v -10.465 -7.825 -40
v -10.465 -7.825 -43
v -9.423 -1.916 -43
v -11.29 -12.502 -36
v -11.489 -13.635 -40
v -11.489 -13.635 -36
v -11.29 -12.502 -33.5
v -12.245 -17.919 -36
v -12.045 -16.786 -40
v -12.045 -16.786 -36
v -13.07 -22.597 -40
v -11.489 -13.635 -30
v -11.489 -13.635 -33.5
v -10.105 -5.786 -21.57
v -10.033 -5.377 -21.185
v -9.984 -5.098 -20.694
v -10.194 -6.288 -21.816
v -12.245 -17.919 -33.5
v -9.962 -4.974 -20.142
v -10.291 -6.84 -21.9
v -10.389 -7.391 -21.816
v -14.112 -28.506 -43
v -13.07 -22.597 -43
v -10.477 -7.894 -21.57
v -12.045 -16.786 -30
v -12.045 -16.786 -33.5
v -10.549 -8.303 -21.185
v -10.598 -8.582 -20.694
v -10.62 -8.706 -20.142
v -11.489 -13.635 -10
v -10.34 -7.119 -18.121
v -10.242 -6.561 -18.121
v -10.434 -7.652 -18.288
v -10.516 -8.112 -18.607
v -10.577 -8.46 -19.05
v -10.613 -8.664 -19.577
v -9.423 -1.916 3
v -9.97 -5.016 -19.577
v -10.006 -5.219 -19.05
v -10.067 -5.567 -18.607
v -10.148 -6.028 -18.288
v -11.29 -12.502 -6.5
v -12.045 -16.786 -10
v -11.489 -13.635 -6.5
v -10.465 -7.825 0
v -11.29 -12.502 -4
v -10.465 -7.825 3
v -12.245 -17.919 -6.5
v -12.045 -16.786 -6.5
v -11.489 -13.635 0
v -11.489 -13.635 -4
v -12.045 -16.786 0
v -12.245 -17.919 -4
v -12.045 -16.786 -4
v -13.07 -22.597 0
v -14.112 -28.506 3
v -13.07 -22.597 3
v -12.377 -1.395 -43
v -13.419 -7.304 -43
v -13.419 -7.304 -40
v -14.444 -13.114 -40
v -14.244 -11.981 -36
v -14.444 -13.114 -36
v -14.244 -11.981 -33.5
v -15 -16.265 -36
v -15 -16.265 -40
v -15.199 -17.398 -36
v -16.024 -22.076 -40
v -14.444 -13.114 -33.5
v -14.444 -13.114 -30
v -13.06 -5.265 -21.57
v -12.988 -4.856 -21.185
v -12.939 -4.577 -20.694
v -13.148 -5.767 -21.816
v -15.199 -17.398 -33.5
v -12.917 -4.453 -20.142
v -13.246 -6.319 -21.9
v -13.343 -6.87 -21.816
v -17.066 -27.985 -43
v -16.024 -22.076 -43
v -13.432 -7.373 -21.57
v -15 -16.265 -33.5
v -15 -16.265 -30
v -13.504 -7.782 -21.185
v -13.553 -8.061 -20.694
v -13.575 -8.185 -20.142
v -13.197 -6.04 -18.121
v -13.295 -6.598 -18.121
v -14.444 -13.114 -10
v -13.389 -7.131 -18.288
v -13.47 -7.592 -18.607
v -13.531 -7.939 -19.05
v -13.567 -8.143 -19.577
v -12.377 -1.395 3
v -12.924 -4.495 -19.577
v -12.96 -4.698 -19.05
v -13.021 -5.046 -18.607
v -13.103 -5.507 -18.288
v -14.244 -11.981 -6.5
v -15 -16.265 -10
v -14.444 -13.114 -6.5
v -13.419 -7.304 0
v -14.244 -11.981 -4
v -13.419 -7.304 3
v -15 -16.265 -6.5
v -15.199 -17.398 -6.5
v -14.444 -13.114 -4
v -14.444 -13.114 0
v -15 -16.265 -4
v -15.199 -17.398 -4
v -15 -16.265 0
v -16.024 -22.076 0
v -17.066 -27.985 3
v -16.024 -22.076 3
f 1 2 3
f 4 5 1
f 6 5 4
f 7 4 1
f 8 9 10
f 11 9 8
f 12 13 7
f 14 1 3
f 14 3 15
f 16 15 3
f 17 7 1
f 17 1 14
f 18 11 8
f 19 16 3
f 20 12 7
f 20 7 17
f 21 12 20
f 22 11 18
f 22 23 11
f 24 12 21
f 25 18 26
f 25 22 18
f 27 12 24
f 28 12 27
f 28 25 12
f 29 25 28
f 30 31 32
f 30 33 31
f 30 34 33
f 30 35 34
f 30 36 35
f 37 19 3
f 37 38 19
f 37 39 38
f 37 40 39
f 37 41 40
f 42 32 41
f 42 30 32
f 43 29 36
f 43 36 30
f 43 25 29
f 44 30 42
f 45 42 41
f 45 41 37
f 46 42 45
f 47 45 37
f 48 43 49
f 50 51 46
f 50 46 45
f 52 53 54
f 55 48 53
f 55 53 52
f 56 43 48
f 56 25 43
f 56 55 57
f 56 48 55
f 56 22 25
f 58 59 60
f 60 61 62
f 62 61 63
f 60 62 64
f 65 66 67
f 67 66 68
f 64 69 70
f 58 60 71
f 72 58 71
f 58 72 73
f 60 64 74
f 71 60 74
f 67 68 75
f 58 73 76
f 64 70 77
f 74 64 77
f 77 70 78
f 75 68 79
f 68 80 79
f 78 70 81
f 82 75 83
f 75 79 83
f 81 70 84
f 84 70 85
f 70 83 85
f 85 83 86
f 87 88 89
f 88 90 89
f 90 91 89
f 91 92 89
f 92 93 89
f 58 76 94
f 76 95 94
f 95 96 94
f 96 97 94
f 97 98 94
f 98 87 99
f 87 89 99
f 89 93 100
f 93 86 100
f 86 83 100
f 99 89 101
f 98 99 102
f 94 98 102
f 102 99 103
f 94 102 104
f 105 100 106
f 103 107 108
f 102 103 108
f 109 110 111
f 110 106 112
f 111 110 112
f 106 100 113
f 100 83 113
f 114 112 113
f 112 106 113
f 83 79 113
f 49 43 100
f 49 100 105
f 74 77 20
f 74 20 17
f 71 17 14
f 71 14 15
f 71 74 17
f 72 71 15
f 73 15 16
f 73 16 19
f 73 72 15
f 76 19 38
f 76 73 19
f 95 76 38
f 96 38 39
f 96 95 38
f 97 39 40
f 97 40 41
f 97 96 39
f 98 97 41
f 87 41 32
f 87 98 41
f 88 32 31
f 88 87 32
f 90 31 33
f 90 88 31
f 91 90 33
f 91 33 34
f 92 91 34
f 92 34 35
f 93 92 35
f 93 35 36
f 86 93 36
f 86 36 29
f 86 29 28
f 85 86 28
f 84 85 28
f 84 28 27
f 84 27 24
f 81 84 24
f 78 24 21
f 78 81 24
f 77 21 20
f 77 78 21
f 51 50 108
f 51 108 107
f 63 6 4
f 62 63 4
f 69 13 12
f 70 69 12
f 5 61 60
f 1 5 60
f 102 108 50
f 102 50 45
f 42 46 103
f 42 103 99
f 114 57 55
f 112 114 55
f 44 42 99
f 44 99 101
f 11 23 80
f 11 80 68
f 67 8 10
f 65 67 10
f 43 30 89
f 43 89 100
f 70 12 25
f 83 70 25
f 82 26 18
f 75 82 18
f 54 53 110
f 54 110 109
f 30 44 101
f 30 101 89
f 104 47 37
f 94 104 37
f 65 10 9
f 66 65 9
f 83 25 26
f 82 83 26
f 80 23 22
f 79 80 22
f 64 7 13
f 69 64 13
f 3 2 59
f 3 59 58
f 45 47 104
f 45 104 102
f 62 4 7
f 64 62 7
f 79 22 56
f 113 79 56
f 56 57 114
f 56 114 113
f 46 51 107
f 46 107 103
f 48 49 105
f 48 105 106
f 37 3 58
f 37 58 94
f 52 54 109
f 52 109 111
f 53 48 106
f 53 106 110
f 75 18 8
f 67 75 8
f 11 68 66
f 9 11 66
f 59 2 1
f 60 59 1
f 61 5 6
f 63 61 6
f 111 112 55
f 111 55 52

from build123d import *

# Parameters (mm, degrees)
SKETCH020_W             = 40
SKETCH020_H             = 27
SKETCH020_R             = 1.9
PAD007_DEPTH            = 3
SKETCH021_W             = 3
SKETCH021_H             = 6
PAD008_DEPTH            = 3
SKETCH021_MIRRORED_2_W  = 3
SKETCH021_MIRRORED_2_H  = 6
PAD008_MIRRORED_2_DEPTH = 3
POCKET013_DEPTH         = 109.846683
BODY005_ROLL_ANGLE      = -90
BODY005_PLACEMENT_ANGLE = -10


with BuildPart() as part:
    # Sketch020 → Pad007 (new body)
    with BuildSketch(Plane.YZ):
        Rectangle(SKETCH020_W, SKETCH020_H)
        with Locations((0, 8.5)):
            Circle(SKETCH020_R, mode=Mode.SUBTRACT)
    extrude(amount=PAD007_DEPTH)

    # Sketch021 (on Face7 of Pad007) → Pad008 (join)
    with BuildSketch(Plane.YZ.offset(3)):
        with Locations((-21.5, 10.5)):
            Rectangle(SKETCH021_W, SKETCH021_H)
    pad008 = extrude(amount=-PAD008_DEPTH)

    # Sketch021 Mirrored 2 → Pad008 Mirrored 2 (add)
    with BuildSketch(Plane(origin=(3, 0, 0), x_dir=(0, -1, 0), z_dir=(-1, 0, 0))):
        with Locations((-21.5, 10.5)):
            Rectangle(SKETCH021_MIRRORED_2_W, SKETCH021_MIRRORED_2_H)
    pad008_mirrored_2 = extrude(amount=PAD008_MIRRORED_2_DEPTH)

    # Mirrored001: Pad008, Pad008 Mirrored 2 across Sketch021 H_Axis
    add(pad008.mirror(Plane(origin=(3, 0, 0), x_dir=(1, 0, 0), z_dir=(0, 0, 1))))
    add(pad008_mirrored_2.mirror(Plane(origin=(3, 0, 0), x_dir=(1, 0, 0), z_dir=(0, 0, 1))))

    # Sketch022 (on Face12 of MultiTransform) → Pocket013 (cut, through all)
    with BuildSketch(Plane.YZ.offset(3)):
        Polygon((-20, 1.6), (-16, 1.6), (-16, 2.75), (-13.5, 2.75), (-13.5, 1.6), (-10, 1.6), (-10, -1.6), (-13.5, -1.6), (-13.5, -2.75), (-16, -2.75), (-16, -1.6), (-20, -1.6), align=None)
    pocket013 = extrude(amount=-POCKET013_DEPTH, mode=Mode.SUBTRACT)

    # Mirrored002: Pocket013 across Sketch022 V_Axis
    add(pocket013.mirror(Plane(origin=(3, 0, 0), x_dir=(1, 0, 0), z_dir=(0, 1, 0))), mode=Mode.SUBTRACT)


with BuildPart() as part_1:
    # Body005 roll: moved
    add(part.part.rotate(Axis((0, 0, 0), (1, 0, 0)), BODY005_ROLL_ANGLE))


with BuildPart() as part_2:
    # Body005 placement: moved
    add(part_1.part.moved(Location((-14.721708, -14.689711, -20))).rotate(Axis((-14.721708, -14.689711, -20), (0, 0, 1)), BODY005_PLACEMENT_ANGLE))


solid = part_2.part
